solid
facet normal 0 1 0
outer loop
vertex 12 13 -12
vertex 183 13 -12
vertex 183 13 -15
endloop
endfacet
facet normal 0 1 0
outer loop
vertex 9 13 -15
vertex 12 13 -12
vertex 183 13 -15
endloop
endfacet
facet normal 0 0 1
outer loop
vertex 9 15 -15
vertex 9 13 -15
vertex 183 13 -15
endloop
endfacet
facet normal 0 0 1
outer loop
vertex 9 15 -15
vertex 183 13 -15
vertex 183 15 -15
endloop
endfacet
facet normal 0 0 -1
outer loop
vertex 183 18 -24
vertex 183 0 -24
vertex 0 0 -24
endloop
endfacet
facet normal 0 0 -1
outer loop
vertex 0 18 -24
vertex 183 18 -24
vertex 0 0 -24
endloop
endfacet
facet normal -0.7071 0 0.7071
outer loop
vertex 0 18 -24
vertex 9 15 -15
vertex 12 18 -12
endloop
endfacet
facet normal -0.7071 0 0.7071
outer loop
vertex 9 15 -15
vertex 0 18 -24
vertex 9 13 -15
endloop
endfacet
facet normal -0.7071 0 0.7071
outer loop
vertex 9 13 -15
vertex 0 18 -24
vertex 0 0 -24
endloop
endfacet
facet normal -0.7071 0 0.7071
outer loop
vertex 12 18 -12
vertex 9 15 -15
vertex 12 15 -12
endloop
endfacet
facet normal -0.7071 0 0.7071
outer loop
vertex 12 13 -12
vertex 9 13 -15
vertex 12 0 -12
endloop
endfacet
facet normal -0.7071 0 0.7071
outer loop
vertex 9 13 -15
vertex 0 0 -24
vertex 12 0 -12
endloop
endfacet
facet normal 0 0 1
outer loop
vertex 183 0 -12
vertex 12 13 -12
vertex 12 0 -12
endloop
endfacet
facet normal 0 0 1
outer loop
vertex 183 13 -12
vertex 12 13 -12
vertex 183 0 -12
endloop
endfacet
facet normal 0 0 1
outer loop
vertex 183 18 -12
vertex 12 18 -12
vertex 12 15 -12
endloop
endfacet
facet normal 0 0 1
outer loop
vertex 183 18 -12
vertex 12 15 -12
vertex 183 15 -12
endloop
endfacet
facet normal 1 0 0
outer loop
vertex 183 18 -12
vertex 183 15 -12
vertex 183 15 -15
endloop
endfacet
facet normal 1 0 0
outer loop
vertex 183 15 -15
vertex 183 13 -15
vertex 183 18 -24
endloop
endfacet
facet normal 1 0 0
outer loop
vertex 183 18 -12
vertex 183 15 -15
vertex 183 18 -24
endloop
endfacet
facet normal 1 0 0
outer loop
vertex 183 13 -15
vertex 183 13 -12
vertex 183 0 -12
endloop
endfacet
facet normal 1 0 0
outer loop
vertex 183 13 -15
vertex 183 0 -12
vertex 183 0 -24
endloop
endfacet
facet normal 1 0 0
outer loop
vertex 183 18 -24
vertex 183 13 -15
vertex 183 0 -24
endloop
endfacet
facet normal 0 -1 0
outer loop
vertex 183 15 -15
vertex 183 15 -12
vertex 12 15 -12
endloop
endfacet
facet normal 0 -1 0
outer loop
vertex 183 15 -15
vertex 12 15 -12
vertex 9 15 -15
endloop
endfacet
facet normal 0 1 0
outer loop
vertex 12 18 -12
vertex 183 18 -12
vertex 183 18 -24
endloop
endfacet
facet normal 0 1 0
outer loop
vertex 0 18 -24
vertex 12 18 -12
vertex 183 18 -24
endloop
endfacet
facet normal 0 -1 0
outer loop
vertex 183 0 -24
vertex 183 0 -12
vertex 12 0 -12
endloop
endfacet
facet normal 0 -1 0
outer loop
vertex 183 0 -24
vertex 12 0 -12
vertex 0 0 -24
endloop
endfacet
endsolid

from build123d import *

# Parameters (mm, degrees)
BOSS_EXTRUDE1_DEPTH = 18
SKETCH2_W           = 3
SKETCH2_H           = 2
CUT_EXTRUDE1_DEPTH  = 185.274252135
SKETCH3_W           = 183
SKETCH3_H           = 18
CUT_EXTRUDE2_DEPTH  = 12


with BuildPart() as part:
    # Sketch1 → Boss-Extrude1 (new body)
    with BuildSketch(Plane(origin=(0, 0, 0), x_dir=(1, 0, 0), z_dir=(0, 1, 0))):
        Polygon((183, 0), (0, 0), (12, 12), (183, 12), align=None)
    boss_extrude1 = extrude(amount=BOSS_EXTRUDE1_DEPTH)

    # Sketch2 → Cut-Extrude1 (cut, symmetric)
    with BuildSketch(Plane(origin=(183, 0, 0), x_dir=(0, 0, -1), z_dir=(1, 0, 0))):
        with Locations((10.5, 14)):
            Rectangle(SKETCH2_W, SKETCH2_H)
    cut_extrude1 = extrude(amount=CUT_EXTRUDE1_DEPTH, both=True, mode=Mode.SUBTRACT)

    # Mirror2: Boss-Extrude1, Cut-Extrude1 across plane
    add(boss_extrude1.mirror(Plane(origin=(0, 18, -12), x_dir=(1, 0, 0), z_dir=(0, 0, -1))))
    add(cut_extrude1.mirror(Plane(origin=(0, 18, -12), x_dir=(1, 0, 0), z_dir=(0, 0, -1))), mode=Mode.SUBTRACT)

    # Sketch3 → Cut-Extrude2 (cut)
    with BuildSketch(Plane.XY):
        with Locations((91.5, 9)):
            Rectangle(SKETCH3_W, SKETCH3_H)
    extrude(amount=-CUT_EXTRUDE2_DEPTH, mode=Mode.SUBTRACT)


solid = part.part
